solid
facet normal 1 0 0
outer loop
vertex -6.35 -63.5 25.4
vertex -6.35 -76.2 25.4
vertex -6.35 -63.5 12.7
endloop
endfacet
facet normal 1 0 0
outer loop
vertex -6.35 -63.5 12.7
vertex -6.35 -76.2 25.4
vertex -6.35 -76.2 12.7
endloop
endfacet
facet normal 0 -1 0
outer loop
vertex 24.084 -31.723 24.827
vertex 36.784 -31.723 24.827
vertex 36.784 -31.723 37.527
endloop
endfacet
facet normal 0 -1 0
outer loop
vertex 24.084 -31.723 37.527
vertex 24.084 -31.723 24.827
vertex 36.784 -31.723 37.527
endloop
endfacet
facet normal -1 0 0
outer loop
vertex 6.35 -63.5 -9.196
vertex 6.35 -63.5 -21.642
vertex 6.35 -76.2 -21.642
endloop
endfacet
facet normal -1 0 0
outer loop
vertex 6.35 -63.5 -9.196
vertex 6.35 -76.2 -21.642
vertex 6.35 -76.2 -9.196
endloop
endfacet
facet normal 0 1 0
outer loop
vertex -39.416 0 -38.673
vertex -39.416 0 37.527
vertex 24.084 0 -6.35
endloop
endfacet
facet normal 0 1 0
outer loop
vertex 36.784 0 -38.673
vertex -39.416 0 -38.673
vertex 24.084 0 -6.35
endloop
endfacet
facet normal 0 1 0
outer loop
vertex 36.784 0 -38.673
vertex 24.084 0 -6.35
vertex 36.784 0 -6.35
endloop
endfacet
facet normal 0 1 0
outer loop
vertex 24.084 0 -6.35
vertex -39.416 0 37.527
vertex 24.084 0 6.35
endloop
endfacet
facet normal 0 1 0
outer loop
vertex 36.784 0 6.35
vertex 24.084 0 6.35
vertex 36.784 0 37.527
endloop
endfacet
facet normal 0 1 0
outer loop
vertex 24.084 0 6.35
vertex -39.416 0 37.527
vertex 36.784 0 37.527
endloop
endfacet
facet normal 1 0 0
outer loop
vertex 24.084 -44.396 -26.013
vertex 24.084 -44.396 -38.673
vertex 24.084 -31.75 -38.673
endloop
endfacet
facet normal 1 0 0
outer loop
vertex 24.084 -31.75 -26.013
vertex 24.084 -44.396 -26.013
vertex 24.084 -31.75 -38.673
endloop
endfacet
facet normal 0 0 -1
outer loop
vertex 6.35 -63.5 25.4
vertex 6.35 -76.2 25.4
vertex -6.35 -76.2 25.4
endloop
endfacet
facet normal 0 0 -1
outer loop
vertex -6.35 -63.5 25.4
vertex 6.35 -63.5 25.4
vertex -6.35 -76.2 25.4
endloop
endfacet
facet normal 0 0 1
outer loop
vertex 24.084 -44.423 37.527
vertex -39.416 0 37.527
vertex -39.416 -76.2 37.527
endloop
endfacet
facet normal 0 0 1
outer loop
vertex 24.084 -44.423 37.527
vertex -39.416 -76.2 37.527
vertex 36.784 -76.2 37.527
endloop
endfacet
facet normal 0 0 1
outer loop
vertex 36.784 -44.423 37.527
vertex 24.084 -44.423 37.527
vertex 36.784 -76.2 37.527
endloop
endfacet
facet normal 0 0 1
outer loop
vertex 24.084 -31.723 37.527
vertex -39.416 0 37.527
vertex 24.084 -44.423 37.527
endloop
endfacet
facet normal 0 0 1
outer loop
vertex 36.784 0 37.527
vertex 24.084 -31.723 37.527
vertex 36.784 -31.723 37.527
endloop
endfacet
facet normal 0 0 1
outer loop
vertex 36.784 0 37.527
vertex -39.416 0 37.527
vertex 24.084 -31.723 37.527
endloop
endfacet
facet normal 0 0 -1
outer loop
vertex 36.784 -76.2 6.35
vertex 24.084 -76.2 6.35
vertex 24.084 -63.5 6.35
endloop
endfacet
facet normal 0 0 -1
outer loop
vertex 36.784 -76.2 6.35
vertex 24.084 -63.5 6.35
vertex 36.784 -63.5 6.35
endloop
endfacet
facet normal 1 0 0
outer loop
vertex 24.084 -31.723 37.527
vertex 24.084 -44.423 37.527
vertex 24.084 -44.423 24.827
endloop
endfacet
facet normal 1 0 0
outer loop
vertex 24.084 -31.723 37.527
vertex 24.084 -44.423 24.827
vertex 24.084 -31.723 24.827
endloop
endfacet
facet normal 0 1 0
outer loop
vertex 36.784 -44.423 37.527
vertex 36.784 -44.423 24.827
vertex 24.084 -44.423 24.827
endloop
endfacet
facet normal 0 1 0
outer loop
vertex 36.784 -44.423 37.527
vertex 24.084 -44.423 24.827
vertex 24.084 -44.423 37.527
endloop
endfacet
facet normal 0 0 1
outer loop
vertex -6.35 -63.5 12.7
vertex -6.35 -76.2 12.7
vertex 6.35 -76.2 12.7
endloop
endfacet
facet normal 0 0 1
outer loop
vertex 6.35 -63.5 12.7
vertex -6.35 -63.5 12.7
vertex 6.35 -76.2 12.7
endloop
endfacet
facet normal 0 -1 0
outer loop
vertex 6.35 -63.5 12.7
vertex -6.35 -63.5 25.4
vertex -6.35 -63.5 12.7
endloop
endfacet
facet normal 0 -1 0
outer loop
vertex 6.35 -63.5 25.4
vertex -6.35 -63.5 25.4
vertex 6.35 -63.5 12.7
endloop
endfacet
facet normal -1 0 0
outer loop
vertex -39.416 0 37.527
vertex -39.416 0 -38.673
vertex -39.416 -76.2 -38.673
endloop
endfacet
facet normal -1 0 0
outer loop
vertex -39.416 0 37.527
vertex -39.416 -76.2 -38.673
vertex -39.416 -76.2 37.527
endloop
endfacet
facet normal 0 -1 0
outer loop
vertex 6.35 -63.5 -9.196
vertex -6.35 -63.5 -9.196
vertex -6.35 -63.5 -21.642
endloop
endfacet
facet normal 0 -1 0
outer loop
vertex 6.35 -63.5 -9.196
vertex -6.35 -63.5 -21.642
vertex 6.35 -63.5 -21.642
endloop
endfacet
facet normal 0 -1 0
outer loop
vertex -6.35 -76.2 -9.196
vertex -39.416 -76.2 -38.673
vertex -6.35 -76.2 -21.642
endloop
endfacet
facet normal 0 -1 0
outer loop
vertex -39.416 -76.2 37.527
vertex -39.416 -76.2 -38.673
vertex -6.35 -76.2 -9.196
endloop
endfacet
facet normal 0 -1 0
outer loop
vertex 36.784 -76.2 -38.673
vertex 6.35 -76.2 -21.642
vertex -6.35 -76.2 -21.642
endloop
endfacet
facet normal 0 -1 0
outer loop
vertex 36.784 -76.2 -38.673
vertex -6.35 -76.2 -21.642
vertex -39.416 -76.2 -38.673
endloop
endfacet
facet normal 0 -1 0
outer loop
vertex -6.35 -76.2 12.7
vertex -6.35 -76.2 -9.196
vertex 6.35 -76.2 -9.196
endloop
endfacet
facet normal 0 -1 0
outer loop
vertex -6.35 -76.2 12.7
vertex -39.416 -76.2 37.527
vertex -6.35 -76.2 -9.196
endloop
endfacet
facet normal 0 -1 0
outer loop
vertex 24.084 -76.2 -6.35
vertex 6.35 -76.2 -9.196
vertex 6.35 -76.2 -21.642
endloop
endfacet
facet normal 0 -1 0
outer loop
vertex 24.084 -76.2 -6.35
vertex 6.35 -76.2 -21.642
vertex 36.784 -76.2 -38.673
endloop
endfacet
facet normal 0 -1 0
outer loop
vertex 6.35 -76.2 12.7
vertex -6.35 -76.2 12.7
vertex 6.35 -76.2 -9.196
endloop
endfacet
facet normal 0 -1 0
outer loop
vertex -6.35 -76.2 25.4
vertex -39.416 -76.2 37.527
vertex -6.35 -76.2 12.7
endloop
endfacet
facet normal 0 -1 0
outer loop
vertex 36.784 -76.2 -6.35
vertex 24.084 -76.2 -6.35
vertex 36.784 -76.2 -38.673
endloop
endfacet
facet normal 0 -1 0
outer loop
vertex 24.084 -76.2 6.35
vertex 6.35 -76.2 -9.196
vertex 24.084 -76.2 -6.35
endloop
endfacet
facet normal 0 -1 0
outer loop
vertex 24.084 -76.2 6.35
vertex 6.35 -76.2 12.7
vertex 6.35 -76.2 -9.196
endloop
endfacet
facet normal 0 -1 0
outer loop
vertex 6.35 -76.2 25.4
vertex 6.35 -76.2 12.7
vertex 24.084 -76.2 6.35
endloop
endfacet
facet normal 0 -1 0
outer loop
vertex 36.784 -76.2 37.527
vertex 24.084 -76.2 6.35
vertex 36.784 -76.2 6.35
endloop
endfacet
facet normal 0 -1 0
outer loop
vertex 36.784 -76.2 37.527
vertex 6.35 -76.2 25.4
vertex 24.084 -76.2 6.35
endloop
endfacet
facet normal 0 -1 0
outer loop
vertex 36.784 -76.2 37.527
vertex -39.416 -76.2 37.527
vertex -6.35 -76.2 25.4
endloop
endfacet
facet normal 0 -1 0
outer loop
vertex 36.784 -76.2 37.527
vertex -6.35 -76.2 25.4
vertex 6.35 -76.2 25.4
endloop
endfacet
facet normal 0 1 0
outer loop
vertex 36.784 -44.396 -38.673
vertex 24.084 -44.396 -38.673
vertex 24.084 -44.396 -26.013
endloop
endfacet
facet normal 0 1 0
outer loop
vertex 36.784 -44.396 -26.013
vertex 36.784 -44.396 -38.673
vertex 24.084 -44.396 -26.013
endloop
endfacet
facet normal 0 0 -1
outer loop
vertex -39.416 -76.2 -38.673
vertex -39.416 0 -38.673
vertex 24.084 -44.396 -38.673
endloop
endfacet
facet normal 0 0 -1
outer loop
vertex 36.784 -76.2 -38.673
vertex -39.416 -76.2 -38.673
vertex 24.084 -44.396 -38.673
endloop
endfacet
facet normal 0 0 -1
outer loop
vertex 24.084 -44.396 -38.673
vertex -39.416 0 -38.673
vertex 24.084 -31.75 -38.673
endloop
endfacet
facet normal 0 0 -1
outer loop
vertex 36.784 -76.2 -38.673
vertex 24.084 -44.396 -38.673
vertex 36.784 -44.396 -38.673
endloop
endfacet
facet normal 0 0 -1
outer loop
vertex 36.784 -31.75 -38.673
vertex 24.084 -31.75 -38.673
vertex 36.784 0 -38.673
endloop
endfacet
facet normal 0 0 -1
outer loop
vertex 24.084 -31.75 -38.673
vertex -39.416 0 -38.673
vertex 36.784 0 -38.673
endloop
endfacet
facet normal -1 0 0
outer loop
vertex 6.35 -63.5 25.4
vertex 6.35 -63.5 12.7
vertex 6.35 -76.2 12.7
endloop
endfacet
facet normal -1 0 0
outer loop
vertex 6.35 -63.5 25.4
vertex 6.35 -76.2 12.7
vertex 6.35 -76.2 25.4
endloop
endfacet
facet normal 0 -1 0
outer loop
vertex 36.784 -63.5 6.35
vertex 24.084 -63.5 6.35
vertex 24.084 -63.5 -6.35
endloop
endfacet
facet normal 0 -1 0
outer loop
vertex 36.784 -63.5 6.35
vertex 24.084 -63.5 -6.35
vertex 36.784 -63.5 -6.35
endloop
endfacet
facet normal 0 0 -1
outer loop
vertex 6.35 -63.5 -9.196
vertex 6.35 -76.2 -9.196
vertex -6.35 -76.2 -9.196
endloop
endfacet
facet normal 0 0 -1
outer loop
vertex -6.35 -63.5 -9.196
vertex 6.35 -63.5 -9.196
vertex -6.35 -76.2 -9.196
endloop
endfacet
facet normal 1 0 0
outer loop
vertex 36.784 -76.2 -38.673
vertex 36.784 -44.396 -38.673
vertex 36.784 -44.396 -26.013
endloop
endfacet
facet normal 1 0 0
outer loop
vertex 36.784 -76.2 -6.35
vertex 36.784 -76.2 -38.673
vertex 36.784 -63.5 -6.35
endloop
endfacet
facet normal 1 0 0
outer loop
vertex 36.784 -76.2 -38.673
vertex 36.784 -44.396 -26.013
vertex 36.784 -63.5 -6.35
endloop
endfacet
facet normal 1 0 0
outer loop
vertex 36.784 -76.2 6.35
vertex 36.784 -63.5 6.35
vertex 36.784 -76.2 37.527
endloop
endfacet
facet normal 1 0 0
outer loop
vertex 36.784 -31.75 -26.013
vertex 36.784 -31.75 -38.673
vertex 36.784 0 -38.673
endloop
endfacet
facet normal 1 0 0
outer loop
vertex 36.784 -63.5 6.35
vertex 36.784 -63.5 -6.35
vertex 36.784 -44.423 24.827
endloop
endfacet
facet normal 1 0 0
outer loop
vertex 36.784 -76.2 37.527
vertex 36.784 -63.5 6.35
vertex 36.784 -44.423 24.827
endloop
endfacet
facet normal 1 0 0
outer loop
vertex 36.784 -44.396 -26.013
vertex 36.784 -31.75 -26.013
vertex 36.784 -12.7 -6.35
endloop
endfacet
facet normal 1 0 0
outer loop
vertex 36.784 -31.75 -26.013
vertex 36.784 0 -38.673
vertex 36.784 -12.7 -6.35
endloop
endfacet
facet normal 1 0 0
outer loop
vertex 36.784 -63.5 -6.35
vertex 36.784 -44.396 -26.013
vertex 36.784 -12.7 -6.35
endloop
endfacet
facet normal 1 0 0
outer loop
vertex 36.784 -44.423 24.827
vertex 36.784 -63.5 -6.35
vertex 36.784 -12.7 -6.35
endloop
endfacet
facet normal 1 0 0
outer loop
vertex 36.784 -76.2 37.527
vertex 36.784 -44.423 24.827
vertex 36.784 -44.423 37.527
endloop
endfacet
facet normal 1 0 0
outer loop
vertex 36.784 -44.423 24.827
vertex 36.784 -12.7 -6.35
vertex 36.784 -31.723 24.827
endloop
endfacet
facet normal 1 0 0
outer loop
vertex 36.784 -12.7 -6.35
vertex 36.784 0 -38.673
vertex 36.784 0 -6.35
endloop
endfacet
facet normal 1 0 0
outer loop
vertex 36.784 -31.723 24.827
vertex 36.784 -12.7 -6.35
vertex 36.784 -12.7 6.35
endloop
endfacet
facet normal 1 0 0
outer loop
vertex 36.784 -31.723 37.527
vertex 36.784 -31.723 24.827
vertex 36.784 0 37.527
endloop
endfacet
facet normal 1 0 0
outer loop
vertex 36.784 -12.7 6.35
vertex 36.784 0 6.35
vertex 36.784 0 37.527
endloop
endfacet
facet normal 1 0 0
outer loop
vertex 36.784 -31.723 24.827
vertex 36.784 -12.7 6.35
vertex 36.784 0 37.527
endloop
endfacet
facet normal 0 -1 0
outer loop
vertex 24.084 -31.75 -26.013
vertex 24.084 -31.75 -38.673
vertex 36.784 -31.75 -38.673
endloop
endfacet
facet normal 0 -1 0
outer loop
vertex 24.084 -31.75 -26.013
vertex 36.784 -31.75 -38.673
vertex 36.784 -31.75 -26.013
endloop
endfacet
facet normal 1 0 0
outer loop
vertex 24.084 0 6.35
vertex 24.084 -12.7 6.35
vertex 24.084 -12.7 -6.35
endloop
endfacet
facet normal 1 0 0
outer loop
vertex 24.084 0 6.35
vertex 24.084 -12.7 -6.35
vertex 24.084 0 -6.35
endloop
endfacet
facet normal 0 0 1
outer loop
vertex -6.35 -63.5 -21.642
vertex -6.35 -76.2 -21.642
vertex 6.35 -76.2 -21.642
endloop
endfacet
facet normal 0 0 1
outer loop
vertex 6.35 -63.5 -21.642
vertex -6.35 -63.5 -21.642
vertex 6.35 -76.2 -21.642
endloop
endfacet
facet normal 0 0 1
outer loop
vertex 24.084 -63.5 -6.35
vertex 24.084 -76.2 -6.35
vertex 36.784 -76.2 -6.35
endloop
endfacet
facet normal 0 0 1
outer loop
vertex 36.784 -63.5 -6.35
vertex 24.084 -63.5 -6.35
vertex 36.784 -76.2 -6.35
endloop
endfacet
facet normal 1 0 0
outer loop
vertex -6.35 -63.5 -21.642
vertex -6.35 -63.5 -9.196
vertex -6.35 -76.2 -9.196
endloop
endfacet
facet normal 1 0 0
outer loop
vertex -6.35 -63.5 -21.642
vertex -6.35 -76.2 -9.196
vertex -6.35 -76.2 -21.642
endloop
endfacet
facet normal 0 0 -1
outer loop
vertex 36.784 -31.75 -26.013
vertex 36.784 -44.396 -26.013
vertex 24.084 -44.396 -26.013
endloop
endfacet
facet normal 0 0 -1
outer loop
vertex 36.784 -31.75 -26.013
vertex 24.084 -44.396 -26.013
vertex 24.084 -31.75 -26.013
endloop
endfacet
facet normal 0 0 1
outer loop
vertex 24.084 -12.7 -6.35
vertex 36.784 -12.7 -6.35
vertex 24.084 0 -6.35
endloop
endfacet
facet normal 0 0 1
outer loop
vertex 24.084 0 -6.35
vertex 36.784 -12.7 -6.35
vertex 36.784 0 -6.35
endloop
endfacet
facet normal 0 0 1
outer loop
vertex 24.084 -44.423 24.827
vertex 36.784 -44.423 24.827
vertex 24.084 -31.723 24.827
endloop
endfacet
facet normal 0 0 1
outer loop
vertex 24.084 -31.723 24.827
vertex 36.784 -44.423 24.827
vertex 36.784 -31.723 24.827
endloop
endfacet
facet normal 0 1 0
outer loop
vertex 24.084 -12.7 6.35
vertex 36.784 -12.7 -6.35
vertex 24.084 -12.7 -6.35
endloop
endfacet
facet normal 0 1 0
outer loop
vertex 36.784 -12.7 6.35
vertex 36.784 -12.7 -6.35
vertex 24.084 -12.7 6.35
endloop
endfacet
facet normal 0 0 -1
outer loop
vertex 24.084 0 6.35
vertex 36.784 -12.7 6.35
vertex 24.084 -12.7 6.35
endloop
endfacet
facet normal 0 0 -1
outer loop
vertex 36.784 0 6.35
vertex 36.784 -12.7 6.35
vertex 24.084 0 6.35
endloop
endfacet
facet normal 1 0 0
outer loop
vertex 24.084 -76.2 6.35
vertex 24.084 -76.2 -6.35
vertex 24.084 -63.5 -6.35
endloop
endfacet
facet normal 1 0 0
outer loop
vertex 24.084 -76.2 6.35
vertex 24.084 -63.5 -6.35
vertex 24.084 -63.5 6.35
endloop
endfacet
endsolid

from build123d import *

# Parameters (mm, degrees)
F0_W     = 76.2
F0_H     = 76.2
F1_DEPTH = 76.2
F2_W     = 12.7
F2_H     = 12.7
F3_DEPTH = 12.7
F5_DEPTH = 12.7
F7_W     = 12.7
F7_H     = 12.7
F7_W_2   = 12.64588
F8_DEPTH = 12.7


with BuildPart() as f1:
    # F0 (on Front) → F1 (new body)
    with BuildSketch(Plane.XZ):
        with Locations((-1.315733, -0.572864)):
            Rectangle(F0_W, F0_H)
    extrude(amount=F1_DEPTH)

    # F2 (on face) → F3 (cut)
    with BuildSketch(Plane.XZ.offset(76.2)):
        with Locations((30.434267, 0)):
            Rectangle(F2_W, F2_H)
    extrude(amount=-F3_DEPTH, mode=Mode.SUBTRACT)

    # F4 (on face) → F5 (cut)
    with BuildSketch(Plane.XZ.offset(76.2)):
        Polygon((6.35, -9.196139), (0, -9.196139), (-6.35, -9.196139), (-6.35, -21.642357), (6.35, -21.642357), align=None)
        Polygon((-6.35, 12.7), (0, 12.7), (6.35, 12.7), (6.35, 25.4), (-6.35, 25.4), align=None)
    extrude(amount=-F5_DEPTH, mode=Mode.SUBTRACT)

    # F7 (on face) → F8 (cut)
    with BuildSketch(Plane.YZ.offset(36.784267)):
        with Locations((-6.35, 0)):
            Rectangle(F7_W, F7_H)
        with Locations((-38.07294, -32.363346)):
            Rectangle(F7_W_2, F7_H)
        with Locations((-38.07294, 31.177136)):
            Rectangle(F7_W, F7_H)
    extrude(amount=-F8_DEPTH, mode=Mode.SUBTRACT)


solid = f1.part
